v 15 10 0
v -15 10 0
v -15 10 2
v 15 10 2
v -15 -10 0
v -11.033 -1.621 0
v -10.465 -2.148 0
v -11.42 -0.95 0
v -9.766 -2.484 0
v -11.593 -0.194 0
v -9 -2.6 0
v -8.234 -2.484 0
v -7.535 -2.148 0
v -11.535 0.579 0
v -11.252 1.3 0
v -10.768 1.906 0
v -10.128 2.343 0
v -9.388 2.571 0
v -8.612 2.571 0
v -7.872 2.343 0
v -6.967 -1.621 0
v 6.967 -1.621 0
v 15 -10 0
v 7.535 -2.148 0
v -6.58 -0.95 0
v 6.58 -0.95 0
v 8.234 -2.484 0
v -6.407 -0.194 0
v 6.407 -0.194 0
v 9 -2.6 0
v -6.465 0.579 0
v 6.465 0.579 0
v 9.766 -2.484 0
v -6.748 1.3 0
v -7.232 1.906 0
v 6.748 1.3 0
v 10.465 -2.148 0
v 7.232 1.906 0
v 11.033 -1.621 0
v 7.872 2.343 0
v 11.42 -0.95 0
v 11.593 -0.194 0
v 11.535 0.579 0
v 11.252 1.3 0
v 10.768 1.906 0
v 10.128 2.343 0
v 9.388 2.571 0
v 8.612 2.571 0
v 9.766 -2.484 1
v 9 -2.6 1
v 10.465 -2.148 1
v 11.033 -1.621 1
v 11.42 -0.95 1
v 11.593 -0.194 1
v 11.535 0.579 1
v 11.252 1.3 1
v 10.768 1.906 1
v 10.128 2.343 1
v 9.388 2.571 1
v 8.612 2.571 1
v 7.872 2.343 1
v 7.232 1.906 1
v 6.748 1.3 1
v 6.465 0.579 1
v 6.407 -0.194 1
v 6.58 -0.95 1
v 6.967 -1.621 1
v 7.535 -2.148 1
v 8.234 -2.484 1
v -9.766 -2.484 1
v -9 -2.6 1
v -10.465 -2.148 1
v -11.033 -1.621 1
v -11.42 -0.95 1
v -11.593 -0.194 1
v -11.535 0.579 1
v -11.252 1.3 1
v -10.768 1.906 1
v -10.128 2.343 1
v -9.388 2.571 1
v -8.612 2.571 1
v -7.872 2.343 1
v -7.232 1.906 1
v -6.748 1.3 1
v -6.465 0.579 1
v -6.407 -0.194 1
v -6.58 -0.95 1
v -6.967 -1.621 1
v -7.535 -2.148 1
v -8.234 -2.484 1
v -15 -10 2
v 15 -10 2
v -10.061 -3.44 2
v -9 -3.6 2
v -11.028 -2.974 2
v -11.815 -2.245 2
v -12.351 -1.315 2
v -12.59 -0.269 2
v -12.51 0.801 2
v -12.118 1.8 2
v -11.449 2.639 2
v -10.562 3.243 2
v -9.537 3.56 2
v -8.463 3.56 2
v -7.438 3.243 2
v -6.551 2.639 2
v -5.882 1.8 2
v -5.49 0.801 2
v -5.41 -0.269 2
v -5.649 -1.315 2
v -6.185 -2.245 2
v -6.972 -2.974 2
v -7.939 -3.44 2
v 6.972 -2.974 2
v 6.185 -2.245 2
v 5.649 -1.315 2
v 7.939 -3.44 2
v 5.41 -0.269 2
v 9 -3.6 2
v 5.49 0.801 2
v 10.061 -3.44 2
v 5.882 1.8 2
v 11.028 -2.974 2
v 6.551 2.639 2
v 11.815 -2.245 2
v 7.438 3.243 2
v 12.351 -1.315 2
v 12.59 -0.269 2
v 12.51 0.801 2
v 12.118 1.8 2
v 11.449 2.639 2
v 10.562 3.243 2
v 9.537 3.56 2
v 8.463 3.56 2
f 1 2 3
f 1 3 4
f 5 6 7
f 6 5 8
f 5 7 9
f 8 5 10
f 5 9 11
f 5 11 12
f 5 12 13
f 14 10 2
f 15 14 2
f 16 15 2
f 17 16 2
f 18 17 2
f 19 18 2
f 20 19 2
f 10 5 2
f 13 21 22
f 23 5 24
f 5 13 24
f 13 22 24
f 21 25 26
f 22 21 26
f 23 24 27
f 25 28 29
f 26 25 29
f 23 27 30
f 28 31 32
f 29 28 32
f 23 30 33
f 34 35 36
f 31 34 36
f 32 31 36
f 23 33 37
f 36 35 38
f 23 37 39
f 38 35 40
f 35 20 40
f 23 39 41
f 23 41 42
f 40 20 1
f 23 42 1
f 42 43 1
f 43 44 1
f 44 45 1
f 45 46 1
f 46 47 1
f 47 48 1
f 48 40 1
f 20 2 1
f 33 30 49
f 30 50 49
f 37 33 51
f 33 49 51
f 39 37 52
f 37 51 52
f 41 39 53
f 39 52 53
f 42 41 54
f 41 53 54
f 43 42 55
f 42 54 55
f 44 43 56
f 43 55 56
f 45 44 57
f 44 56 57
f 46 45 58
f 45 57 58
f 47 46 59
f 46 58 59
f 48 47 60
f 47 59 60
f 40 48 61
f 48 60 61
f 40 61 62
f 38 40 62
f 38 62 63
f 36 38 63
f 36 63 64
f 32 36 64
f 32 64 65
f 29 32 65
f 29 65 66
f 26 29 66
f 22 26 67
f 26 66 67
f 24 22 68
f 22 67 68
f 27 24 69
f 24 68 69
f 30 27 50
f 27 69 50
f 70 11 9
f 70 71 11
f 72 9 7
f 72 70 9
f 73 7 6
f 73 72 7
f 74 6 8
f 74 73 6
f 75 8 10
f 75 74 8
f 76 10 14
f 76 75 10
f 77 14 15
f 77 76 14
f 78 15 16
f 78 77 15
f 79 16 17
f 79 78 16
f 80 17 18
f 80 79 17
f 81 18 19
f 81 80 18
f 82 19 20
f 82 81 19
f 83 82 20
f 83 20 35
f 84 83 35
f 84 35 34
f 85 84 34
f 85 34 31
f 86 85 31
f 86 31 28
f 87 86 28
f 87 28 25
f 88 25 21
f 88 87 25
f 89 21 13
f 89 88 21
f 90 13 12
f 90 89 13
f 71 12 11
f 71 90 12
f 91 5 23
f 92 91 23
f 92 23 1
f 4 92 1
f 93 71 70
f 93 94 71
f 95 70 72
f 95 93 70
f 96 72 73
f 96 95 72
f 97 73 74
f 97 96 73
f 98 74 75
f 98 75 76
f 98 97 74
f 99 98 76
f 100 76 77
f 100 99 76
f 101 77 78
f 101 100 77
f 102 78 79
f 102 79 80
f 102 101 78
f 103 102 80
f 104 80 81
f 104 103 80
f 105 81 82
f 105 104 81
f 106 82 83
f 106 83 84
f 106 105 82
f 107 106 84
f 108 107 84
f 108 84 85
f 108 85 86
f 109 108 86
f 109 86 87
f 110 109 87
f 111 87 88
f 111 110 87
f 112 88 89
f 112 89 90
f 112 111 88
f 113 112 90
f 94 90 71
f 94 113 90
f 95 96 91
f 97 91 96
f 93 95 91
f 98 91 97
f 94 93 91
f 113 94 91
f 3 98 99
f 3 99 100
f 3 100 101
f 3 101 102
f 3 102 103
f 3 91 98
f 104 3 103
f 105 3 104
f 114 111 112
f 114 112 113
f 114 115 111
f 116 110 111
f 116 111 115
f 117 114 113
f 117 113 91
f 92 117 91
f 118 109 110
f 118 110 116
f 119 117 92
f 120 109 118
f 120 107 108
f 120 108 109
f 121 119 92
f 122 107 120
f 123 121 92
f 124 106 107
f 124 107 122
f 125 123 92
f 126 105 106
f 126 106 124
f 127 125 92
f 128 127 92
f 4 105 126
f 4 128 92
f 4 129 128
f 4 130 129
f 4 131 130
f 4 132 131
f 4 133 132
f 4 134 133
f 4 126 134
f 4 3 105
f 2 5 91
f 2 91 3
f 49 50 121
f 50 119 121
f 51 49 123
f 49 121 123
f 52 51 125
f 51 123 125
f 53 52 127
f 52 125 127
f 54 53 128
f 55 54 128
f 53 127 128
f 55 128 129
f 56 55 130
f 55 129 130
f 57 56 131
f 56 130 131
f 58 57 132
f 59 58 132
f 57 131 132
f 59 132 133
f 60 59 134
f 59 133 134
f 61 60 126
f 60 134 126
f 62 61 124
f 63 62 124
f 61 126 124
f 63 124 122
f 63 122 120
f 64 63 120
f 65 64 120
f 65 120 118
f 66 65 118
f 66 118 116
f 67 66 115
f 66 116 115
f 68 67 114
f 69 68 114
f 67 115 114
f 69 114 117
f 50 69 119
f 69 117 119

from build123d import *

# Parameters (mm, degrees)
SKETCH1_W          = 30
SKETCH1_H          = 20
BASE_FLANGE1_DEPTH = 2


# Sheet-metal steps are written as plain solids
with BuildPart() as part:
    # Sketch1 → Base-Flange1 (new body)
    with BuildSketch(Plane.XY):
        Rectangle(SKETCH1_W, SKETCH1_H)
    extrude(amount=BASE_FLANGE1_DEPTH)

    # Sketch6 → Ø5.2 (5.2) Diameter Hole1 (revolve, cut)
    with BuildSketch(Plane(origin=(-9, 0, 2), x_dir=(0, -1, 0), z_dir=(1, 0, 0))):
        Polygon((0, 0), (0, 2), (2.6, 2), (2.6, 1), (3.6, 0), align=None)
    f_5_2_5_2_diameter_hole1 = revolve(axis=Axis((-9, 0, 8.35), (0, 0, -1)), mode=Mode.SUBTRACT)

    # Mirror1: Ø5.2 (5.2) Diameter Hole1 across plane
    add(f_5_2_5_2_diameter_hole1.mirror(Plane(origin=(0, 0, 0), x_dir=(0, 0, 1), z_dir=(1, 0, 0))), mode=Mode.SUBTRACT)


solid = part.part
